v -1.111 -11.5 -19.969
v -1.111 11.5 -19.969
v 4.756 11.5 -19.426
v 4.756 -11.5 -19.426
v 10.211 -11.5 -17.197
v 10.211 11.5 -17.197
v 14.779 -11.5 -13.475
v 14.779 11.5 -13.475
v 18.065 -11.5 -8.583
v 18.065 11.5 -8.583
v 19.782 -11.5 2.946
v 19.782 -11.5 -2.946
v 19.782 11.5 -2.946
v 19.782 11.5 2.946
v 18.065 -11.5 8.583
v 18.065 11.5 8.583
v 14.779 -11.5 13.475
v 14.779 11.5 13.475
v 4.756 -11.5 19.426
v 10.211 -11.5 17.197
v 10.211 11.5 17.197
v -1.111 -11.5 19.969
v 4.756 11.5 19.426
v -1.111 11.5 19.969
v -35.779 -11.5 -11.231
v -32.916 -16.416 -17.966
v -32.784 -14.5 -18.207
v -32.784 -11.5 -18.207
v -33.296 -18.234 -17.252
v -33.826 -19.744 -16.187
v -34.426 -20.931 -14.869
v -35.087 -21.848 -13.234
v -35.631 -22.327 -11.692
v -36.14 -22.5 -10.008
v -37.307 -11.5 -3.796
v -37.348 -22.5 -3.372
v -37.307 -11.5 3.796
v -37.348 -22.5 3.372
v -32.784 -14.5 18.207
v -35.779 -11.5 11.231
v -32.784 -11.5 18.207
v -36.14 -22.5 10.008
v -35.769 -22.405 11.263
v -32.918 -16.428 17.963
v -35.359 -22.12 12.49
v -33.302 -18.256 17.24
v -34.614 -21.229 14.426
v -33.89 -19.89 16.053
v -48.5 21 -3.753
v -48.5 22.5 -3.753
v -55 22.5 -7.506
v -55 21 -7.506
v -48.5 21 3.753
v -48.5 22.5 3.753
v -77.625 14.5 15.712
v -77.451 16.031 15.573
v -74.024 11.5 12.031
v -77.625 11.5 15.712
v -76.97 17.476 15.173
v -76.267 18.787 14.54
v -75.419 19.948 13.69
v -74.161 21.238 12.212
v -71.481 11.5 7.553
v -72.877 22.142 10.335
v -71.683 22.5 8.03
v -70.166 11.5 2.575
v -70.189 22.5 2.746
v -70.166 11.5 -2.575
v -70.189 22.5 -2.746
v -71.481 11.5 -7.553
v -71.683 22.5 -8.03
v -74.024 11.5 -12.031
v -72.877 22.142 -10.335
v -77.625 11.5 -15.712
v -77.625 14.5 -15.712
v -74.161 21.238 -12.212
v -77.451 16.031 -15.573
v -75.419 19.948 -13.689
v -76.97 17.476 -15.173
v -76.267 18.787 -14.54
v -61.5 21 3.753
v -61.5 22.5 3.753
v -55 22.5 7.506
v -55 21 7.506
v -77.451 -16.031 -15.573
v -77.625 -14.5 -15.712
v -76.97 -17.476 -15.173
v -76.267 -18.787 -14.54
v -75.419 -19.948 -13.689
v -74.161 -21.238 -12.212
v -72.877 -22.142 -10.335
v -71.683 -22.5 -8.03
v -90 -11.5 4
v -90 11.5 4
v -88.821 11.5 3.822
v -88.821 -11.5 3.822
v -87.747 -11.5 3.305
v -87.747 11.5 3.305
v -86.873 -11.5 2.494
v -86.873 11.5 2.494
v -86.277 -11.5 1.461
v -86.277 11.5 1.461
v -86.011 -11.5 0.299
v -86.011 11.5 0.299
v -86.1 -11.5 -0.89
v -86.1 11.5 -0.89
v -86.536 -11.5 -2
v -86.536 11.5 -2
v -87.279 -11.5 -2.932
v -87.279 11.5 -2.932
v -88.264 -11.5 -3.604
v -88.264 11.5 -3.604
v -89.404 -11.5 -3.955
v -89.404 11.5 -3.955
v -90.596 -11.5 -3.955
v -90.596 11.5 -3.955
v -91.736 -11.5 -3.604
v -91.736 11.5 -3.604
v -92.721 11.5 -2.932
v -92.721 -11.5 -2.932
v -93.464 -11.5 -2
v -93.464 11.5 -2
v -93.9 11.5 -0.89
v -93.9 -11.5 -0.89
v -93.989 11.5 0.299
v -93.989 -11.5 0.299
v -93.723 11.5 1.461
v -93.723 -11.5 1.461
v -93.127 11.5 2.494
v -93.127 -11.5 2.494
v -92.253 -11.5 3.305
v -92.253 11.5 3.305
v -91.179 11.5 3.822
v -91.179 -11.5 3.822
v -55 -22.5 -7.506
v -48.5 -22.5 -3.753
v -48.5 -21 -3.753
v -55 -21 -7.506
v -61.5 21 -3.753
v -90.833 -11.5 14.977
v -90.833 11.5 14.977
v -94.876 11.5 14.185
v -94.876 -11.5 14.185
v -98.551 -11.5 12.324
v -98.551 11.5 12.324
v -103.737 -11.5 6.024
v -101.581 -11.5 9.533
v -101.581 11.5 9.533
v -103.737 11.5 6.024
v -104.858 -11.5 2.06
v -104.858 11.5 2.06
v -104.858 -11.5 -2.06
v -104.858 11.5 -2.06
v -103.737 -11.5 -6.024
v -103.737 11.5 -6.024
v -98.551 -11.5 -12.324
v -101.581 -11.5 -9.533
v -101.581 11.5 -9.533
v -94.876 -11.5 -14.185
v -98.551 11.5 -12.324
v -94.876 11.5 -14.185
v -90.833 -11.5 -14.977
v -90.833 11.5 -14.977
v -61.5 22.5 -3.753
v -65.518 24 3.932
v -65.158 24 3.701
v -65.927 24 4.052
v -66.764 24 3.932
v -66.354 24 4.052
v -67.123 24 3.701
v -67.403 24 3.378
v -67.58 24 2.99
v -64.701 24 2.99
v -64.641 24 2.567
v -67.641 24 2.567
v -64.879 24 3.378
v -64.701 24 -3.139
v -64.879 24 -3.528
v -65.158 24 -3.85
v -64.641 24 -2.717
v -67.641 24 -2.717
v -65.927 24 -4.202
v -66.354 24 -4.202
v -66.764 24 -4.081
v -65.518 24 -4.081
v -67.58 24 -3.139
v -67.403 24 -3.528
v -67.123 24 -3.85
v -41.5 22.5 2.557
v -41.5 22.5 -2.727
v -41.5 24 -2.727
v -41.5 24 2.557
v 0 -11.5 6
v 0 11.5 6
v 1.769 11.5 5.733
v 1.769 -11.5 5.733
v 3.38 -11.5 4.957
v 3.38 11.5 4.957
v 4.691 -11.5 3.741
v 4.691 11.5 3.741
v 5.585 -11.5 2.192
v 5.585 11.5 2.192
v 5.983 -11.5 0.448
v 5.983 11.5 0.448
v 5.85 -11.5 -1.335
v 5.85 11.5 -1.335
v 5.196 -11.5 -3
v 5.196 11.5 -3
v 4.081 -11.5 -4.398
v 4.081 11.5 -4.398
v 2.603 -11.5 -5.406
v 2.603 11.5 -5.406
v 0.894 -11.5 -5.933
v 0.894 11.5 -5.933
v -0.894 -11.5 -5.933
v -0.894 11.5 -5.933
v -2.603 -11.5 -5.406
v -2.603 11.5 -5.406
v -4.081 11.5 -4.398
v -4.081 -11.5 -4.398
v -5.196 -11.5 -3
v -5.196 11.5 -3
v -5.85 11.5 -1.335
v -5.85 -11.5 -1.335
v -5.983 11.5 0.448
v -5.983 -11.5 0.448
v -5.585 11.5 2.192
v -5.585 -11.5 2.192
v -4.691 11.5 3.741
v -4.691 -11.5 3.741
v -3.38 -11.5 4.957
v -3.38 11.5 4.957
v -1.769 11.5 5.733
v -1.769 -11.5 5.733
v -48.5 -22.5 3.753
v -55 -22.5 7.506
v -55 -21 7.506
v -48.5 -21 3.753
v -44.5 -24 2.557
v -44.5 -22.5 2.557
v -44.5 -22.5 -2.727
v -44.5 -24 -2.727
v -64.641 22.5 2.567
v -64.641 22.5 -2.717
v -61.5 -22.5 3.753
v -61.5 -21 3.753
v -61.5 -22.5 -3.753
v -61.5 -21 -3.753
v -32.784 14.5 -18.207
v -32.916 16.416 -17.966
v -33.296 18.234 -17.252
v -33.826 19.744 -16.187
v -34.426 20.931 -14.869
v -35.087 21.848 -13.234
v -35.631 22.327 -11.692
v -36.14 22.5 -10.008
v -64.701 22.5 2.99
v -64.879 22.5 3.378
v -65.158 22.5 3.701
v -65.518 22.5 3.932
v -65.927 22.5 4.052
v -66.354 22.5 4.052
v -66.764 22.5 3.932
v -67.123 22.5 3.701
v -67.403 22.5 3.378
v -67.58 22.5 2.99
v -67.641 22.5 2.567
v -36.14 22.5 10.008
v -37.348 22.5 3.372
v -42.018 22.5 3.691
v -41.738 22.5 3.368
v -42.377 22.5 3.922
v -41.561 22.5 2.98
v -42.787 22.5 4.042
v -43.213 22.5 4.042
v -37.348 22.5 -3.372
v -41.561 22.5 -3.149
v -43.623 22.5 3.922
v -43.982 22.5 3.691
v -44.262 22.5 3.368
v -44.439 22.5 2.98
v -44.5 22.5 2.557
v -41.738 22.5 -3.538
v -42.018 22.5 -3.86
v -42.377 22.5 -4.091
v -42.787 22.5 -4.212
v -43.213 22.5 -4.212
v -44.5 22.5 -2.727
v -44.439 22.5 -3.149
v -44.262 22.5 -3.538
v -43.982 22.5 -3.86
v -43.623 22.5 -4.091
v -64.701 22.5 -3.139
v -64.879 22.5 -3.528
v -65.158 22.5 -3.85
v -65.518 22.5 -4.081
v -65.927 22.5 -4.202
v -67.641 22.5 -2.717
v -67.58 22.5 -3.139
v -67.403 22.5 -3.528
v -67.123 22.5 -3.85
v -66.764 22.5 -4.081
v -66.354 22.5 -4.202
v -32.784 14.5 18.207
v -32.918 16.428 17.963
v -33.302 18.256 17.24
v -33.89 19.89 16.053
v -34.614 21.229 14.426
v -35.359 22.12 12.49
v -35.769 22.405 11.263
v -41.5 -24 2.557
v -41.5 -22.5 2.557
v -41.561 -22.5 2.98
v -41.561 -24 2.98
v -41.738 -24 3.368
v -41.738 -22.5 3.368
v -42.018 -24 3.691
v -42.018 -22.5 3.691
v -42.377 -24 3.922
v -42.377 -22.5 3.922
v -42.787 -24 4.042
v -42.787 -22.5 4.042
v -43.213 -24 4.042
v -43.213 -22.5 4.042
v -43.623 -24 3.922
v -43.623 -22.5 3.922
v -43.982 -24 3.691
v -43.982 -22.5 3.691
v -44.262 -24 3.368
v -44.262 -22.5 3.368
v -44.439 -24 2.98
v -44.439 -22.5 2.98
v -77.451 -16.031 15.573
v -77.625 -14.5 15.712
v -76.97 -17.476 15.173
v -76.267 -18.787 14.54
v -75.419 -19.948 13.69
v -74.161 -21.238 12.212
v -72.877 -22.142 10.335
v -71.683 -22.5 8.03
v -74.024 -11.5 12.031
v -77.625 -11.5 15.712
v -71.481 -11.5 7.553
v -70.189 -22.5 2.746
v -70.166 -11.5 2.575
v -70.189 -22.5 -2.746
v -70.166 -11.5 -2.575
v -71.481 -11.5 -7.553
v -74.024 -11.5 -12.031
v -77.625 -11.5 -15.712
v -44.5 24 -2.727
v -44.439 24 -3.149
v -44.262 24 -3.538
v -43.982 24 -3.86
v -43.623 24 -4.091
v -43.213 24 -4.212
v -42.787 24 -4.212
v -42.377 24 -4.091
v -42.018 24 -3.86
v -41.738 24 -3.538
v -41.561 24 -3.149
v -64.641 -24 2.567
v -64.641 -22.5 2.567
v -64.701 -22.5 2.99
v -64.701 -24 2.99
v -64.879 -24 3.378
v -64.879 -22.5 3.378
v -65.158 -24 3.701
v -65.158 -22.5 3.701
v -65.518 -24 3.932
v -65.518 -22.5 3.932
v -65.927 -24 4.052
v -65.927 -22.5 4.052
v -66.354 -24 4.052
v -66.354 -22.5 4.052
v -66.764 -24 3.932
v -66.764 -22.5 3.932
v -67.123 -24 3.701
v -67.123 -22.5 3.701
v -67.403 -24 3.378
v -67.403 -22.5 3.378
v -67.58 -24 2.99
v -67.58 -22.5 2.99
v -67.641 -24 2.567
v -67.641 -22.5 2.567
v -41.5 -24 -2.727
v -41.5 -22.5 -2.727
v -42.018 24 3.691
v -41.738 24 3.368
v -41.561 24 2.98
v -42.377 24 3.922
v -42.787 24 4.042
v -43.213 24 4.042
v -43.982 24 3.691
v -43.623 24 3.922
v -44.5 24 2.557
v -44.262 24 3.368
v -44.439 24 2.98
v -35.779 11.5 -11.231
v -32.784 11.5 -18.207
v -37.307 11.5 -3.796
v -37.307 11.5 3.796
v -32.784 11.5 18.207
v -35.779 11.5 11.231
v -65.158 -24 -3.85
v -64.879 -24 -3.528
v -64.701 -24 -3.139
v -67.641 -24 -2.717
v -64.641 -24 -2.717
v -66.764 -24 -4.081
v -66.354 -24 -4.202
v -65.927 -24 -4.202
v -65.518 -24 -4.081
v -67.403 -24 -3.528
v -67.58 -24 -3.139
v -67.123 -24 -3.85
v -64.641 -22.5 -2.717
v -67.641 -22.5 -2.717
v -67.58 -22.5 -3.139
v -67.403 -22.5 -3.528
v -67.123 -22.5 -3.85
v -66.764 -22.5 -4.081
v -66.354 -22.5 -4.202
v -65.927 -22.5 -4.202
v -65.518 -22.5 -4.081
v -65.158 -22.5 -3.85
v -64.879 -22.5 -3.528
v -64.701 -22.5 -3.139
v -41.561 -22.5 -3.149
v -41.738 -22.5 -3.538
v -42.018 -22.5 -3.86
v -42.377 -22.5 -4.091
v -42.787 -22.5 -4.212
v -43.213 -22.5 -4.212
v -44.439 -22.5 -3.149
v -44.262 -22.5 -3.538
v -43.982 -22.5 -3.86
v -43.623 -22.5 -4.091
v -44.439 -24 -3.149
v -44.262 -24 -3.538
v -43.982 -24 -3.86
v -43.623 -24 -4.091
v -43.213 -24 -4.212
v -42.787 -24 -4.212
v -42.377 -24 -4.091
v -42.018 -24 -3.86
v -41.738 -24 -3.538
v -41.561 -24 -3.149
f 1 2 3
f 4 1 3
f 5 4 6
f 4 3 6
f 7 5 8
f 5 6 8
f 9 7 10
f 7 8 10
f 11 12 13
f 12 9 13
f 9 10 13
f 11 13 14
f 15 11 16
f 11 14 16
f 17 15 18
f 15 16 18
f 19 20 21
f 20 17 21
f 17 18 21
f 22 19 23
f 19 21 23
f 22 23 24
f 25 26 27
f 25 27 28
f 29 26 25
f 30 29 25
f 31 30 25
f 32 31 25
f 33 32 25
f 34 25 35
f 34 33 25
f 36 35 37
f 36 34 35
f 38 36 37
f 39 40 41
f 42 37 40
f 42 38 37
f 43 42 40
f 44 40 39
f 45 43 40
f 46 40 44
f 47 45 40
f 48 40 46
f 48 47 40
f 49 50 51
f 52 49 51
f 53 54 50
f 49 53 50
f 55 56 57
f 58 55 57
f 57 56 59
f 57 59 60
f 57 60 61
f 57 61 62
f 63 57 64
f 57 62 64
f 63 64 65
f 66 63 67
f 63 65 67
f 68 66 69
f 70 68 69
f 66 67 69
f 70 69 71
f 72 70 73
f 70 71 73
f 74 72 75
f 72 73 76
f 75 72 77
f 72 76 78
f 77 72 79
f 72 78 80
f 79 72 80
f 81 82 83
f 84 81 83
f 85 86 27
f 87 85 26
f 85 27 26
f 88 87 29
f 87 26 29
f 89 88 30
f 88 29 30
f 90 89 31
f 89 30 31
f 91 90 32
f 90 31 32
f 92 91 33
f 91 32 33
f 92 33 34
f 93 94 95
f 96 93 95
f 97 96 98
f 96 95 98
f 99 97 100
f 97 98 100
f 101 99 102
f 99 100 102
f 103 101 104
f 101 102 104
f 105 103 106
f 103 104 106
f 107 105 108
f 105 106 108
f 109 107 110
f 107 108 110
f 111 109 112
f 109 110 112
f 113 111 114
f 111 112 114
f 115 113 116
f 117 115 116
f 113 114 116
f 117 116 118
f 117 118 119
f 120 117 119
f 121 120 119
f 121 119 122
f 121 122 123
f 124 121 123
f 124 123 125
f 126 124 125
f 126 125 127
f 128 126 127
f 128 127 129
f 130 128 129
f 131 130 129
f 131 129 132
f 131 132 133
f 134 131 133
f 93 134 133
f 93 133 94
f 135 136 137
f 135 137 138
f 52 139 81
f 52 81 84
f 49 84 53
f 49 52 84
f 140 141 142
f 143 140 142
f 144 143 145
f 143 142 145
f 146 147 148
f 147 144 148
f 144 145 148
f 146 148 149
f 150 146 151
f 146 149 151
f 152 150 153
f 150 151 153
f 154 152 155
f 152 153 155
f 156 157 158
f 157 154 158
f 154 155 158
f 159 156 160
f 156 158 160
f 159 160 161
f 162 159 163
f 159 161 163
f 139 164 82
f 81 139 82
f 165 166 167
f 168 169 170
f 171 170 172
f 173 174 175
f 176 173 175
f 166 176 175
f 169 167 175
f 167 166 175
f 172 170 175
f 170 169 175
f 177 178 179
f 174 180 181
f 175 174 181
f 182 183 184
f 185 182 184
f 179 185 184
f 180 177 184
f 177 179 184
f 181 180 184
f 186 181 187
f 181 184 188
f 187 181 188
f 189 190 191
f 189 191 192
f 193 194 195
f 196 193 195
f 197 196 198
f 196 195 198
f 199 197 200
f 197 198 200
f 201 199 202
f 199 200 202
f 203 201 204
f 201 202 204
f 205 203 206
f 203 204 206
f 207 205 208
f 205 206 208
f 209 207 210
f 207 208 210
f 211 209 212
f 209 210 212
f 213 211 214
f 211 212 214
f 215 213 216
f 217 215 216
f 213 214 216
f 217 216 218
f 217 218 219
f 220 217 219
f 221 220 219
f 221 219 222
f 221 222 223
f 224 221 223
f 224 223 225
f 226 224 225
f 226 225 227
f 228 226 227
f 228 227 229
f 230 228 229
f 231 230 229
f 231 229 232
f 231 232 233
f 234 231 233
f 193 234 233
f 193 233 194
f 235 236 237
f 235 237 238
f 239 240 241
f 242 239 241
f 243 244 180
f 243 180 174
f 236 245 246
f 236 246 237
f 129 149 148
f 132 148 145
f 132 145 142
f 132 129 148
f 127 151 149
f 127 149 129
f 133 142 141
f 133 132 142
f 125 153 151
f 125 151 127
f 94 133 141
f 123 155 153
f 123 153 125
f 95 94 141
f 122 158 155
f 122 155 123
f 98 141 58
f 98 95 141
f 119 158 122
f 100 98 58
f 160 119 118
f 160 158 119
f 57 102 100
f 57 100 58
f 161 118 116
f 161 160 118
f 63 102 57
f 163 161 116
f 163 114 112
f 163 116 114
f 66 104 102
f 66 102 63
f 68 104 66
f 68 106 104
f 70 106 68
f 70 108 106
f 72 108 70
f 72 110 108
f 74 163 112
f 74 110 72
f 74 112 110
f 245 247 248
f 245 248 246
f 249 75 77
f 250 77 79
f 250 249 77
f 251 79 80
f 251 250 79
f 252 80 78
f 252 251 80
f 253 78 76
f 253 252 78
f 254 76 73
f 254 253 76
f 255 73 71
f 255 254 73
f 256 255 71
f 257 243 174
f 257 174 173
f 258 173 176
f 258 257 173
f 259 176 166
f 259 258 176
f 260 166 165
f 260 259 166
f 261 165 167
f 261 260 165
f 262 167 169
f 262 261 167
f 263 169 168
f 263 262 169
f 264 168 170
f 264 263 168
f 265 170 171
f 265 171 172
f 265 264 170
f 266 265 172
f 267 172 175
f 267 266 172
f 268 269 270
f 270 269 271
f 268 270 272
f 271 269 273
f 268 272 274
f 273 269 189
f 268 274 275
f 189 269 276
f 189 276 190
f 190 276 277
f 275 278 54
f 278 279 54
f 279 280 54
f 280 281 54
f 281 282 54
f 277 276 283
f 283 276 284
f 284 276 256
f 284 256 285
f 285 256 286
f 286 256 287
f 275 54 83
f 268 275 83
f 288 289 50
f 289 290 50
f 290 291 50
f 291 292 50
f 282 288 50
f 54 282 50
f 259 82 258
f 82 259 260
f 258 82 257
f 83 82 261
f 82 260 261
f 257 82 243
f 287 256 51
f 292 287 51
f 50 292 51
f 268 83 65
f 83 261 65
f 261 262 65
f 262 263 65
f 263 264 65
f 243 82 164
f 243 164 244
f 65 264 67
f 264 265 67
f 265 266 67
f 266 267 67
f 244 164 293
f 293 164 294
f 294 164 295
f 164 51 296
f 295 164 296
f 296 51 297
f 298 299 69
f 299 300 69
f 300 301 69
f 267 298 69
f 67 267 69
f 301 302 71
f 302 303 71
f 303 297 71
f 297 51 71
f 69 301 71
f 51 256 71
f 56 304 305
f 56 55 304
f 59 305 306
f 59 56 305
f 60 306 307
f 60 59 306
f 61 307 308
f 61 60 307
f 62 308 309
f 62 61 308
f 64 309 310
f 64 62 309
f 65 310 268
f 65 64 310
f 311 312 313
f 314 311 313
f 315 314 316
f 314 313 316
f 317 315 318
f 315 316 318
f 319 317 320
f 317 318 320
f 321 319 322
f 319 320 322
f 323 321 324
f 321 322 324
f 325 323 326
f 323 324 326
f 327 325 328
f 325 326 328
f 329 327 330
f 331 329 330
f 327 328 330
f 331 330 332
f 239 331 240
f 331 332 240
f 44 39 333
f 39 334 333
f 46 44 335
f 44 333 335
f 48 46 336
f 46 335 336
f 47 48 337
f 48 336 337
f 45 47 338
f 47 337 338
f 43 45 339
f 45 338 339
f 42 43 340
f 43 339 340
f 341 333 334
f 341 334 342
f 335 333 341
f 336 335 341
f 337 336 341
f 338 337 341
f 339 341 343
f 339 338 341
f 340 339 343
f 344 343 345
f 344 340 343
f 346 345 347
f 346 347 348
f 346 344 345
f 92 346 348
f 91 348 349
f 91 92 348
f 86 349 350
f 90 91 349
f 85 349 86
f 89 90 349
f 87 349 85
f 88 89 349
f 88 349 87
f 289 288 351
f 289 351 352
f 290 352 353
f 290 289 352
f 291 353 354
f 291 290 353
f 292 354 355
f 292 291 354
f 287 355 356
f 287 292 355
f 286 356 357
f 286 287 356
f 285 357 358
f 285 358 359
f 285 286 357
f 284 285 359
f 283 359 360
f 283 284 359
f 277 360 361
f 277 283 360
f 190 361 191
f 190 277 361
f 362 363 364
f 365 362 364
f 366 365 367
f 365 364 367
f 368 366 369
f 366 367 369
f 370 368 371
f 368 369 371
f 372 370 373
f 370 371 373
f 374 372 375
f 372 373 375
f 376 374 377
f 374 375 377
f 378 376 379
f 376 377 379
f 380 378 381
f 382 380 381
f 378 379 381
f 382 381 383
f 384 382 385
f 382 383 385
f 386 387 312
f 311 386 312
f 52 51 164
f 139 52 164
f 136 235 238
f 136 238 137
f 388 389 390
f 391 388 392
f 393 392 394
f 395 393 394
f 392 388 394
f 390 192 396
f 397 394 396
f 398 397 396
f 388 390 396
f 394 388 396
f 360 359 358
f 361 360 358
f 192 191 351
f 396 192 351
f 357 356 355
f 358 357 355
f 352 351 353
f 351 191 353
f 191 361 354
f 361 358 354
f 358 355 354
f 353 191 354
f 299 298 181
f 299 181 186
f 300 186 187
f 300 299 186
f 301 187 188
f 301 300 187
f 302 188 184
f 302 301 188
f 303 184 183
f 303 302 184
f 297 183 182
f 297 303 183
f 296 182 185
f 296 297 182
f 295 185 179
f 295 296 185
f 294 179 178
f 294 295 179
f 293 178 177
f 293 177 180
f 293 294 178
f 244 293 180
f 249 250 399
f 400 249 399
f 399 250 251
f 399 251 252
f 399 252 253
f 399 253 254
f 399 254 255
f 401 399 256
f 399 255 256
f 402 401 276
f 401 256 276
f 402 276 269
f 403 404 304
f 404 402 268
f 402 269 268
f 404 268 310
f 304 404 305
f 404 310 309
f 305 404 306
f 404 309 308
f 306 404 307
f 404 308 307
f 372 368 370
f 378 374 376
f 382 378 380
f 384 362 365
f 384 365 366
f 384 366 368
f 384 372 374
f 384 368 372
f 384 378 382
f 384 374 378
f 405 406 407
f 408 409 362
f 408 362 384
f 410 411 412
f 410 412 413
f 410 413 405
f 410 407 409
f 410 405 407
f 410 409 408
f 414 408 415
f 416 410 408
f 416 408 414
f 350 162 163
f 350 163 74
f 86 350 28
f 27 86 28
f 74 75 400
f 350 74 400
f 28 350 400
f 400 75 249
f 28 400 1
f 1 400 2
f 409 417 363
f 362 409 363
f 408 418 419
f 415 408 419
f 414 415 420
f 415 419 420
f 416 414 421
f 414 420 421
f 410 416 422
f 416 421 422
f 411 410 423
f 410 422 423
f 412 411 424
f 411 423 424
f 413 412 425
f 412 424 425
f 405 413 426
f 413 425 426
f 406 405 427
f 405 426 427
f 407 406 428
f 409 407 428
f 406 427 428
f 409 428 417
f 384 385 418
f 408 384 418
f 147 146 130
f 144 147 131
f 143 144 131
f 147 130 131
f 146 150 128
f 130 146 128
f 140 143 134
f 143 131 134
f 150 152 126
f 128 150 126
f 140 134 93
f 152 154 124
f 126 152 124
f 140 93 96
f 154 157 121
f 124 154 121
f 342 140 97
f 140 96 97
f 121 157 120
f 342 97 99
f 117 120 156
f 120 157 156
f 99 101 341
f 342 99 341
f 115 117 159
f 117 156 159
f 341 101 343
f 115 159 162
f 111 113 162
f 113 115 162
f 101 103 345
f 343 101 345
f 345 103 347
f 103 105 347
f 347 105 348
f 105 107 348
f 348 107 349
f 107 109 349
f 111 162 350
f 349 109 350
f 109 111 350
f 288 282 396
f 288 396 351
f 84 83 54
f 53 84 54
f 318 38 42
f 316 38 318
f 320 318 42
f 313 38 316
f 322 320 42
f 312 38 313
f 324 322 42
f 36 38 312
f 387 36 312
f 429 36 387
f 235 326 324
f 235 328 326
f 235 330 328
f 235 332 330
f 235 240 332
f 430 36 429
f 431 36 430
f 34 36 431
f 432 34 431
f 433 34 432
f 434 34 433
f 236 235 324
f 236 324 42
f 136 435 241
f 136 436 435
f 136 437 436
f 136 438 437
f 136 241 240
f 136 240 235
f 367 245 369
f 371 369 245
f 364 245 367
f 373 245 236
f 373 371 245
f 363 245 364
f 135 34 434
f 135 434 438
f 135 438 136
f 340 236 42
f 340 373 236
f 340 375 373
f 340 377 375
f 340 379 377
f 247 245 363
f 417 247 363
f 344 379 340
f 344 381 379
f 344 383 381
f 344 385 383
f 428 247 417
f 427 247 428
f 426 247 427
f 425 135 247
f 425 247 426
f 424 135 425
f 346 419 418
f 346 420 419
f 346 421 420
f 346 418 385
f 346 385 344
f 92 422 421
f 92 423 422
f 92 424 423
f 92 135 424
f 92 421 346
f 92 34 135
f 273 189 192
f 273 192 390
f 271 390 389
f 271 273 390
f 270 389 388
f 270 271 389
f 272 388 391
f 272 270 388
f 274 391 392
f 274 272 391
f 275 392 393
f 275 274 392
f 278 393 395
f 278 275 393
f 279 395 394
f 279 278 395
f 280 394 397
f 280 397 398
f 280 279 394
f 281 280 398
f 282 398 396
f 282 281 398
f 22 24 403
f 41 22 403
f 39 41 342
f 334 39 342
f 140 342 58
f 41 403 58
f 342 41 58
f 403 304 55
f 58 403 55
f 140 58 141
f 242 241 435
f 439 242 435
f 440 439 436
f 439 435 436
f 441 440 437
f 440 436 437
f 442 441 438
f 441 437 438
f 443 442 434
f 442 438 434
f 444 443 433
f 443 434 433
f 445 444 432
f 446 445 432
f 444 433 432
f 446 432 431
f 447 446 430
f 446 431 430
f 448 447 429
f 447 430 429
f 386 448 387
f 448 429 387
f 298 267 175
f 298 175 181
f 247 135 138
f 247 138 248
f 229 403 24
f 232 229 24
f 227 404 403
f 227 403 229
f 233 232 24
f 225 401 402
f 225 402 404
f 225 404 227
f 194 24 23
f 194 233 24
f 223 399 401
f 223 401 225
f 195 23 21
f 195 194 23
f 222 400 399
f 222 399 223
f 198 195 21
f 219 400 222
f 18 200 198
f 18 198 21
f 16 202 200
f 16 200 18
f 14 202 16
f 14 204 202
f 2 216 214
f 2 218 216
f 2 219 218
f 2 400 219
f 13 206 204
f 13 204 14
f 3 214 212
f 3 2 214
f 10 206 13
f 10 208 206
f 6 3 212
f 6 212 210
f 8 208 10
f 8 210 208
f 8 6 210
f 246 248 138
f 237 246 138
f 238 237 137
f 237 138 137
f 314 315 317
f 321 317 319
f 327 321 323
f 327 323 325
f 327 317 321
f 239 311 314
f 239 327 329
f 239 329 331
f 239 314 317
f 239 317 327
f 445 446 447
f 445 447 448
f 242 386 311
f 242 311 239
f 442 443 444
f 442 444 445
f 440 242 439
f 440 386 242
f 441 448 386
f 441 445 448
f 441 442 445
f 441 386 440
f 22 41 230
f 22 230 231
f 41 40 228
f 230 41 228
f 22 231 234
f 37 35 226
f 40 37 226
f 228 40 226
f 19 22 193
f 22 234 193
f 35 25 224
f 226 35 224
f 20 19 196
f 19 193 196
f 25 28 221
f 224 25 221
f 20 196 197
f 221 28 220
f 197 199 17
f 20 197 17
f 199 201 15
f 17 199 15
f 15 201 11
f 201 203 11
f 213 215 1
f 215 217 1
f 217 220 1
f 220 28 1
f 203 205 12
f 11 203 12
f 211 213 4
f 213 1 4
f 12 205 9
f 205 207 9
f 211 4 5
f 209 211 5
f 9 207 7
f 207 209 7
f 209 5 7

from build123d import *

# Parameters (mm, degrees)
BOSS_EXTRUDE1_DEPTH = 22.5
SKETCH2_R           = 20
SKETCH2_R_2         = 37.5
CUT_EXTRUDE2_DEPTH  = 11
FILLET1_R           = 8
SKETCH3_R           = 6
SKETCH3_R_2         = 4
CUT_EXTRUDE3_DEPTH  = 44.5
CUT_EXTRUDE6_DEPTH  = 1.5
BOSS_EXTRUDE2_DEPTH = 1.5


with BuildPart() as part:
    # Sketch1 → Boss-Extrude1 (new, symmetric)
    with BuildSketch(Plane(origin=(0, 0, 0), x_dir=(1, 0, 0), z_dir=(0, 1, 0))):
        with BuildLine():
            Line((-90.833333333, 14.976833963), (-1.111111111, 19.969111951))
            ThreePointArc((-1.111111111, 19.969111951), (20, 0), (-1.111111111, -19.969111951))
            Line((-1.111111111, -19.969111951), (-90.833333333, -14.976833963))
            ThreePointArc((-90.833333333, -14.976833963), (-105, 0), (-90.833333333, 14.976833963))
        make_face()
    extrude(amount=BOSS_EXTRUDE1_DEPTH, both=True)

    # Sketch2 → Cut-Extrude2 (cut)
    with BuildSketch(Plane(origin=(0, 22.5, 0), x_dir=(1, 0, 0), z_dir=(0, 1, 0))):
        with Locations((-90, 0)):
            Circle(SKETCH2_R)
        Circle(SKETCH2_R_2)
    cut_extrude2 = extrude(amount=-CUT_EXTRUDE2_DEPTH, mode=Mode.SUBTRACT)

    # Mirror1: Cut-Extrude2 across plane
    add(cut_extrude2.mirror(Plane.ZX), mode=Mode.SUBTRACT)

    # Fillet1
    fillet1_edges = [part.edges().sort_by_distance(p)[0] for p in [
        (-55.204285794, 22.5, 16.959287199),
        (-55.204285794, 22.5, -16.959287199),
        (-55.204285794, -22.5, 16.959287199),
        (-55.204285794, -22.5, -16.959287199),
    ]]
    fillet(fillet1_edges, radius=FILLET1_R)

    # Sketch3 → Cut-Extrude3 (cut)
    with BuildSketch(Plane(origin=(0, 11.5, 0), x_dir=(1, 0, 0), z_dir=(0, 1, 0))):
        with Locations(Location((0, 0, 0), (0, 0, 270))):
            Circle(SKETCH3_R)
        with Locations(Location((-90, 0, 0), (0, 0, 270))):
            Circle(SKETCH3_R_2)
    extrude(amount=-CUT_EXTRUDE3_DEPTH, mode=Mode.SUBTRACT)

    # Sketch5 → Cut-Extrude6 (cut)
    with BuildSketch(Plane(origin=(0, 22.5, 0), x_dir=(1, 0, 0), z_dir=(0, 1, 0))):
        Polygon((-55, -7.505553499), (-48.5, -3.75277675), (-48.5, 3.75277675), (-55, 7.505553499), (-61.5, 3.75277675), (-61.5, -3.75277675), align=None)
    cut_extrude6 = extrude(amount=-CUT_EXTRUDE6_DEPTH, mode=Mode.SUBTRACT)

    # Sketch6 → Boss-Extrude2 (add)
    with BuildSketch(Plane(origin=(0, 22.5, 0), x_dir=(1, 0, 0), z_dir=(0, 1, 0))):
        with BuildLine():
            Line((-64.640723816, 2.716865752), (-64.640723816, -2.567368827))
            ThreePointArc((-64.640723816, -2.567368827), (-66.140723816, -4.067368827), (-67.640723816, -2.567368827))
            Line((-67.640723816, -2.567368827), (-67.640723816, 2.716865752))
            ThreePointArc((-67.640723816, 2.716865752), (-66.140723816, 4.216865752), (-64.640723816, 2.716865752))
        make_face()
        with BuildLine():
            Line((-41.5, 2.726821799), (-41.5, -2.55741278))
            ThreePointArc((-41.5, -2.55741278), (-43, -4.05741278), (-44.5, -2.55741278))
            Line((-44.5, -2.55741278), (-44.5, 2.726821799))
            ThreePointArc((-44.5, 2.726821799), (-43, 4.226821799), (-41.5, 2.726821799))
        make_face()
    boss_extrude2 = extrude(amount=BOSS_EXTRUDE2_DEPTH)

    # Mirror2: Cut-Extrude6, Boss-Extrude2 across plane
    add(cut_extrude6.mirror(Plane.ZX), mode=Mode.SUBTRACT)
    add(boss_extrude2.mirror(Plane.ZX))


solid = part.part
